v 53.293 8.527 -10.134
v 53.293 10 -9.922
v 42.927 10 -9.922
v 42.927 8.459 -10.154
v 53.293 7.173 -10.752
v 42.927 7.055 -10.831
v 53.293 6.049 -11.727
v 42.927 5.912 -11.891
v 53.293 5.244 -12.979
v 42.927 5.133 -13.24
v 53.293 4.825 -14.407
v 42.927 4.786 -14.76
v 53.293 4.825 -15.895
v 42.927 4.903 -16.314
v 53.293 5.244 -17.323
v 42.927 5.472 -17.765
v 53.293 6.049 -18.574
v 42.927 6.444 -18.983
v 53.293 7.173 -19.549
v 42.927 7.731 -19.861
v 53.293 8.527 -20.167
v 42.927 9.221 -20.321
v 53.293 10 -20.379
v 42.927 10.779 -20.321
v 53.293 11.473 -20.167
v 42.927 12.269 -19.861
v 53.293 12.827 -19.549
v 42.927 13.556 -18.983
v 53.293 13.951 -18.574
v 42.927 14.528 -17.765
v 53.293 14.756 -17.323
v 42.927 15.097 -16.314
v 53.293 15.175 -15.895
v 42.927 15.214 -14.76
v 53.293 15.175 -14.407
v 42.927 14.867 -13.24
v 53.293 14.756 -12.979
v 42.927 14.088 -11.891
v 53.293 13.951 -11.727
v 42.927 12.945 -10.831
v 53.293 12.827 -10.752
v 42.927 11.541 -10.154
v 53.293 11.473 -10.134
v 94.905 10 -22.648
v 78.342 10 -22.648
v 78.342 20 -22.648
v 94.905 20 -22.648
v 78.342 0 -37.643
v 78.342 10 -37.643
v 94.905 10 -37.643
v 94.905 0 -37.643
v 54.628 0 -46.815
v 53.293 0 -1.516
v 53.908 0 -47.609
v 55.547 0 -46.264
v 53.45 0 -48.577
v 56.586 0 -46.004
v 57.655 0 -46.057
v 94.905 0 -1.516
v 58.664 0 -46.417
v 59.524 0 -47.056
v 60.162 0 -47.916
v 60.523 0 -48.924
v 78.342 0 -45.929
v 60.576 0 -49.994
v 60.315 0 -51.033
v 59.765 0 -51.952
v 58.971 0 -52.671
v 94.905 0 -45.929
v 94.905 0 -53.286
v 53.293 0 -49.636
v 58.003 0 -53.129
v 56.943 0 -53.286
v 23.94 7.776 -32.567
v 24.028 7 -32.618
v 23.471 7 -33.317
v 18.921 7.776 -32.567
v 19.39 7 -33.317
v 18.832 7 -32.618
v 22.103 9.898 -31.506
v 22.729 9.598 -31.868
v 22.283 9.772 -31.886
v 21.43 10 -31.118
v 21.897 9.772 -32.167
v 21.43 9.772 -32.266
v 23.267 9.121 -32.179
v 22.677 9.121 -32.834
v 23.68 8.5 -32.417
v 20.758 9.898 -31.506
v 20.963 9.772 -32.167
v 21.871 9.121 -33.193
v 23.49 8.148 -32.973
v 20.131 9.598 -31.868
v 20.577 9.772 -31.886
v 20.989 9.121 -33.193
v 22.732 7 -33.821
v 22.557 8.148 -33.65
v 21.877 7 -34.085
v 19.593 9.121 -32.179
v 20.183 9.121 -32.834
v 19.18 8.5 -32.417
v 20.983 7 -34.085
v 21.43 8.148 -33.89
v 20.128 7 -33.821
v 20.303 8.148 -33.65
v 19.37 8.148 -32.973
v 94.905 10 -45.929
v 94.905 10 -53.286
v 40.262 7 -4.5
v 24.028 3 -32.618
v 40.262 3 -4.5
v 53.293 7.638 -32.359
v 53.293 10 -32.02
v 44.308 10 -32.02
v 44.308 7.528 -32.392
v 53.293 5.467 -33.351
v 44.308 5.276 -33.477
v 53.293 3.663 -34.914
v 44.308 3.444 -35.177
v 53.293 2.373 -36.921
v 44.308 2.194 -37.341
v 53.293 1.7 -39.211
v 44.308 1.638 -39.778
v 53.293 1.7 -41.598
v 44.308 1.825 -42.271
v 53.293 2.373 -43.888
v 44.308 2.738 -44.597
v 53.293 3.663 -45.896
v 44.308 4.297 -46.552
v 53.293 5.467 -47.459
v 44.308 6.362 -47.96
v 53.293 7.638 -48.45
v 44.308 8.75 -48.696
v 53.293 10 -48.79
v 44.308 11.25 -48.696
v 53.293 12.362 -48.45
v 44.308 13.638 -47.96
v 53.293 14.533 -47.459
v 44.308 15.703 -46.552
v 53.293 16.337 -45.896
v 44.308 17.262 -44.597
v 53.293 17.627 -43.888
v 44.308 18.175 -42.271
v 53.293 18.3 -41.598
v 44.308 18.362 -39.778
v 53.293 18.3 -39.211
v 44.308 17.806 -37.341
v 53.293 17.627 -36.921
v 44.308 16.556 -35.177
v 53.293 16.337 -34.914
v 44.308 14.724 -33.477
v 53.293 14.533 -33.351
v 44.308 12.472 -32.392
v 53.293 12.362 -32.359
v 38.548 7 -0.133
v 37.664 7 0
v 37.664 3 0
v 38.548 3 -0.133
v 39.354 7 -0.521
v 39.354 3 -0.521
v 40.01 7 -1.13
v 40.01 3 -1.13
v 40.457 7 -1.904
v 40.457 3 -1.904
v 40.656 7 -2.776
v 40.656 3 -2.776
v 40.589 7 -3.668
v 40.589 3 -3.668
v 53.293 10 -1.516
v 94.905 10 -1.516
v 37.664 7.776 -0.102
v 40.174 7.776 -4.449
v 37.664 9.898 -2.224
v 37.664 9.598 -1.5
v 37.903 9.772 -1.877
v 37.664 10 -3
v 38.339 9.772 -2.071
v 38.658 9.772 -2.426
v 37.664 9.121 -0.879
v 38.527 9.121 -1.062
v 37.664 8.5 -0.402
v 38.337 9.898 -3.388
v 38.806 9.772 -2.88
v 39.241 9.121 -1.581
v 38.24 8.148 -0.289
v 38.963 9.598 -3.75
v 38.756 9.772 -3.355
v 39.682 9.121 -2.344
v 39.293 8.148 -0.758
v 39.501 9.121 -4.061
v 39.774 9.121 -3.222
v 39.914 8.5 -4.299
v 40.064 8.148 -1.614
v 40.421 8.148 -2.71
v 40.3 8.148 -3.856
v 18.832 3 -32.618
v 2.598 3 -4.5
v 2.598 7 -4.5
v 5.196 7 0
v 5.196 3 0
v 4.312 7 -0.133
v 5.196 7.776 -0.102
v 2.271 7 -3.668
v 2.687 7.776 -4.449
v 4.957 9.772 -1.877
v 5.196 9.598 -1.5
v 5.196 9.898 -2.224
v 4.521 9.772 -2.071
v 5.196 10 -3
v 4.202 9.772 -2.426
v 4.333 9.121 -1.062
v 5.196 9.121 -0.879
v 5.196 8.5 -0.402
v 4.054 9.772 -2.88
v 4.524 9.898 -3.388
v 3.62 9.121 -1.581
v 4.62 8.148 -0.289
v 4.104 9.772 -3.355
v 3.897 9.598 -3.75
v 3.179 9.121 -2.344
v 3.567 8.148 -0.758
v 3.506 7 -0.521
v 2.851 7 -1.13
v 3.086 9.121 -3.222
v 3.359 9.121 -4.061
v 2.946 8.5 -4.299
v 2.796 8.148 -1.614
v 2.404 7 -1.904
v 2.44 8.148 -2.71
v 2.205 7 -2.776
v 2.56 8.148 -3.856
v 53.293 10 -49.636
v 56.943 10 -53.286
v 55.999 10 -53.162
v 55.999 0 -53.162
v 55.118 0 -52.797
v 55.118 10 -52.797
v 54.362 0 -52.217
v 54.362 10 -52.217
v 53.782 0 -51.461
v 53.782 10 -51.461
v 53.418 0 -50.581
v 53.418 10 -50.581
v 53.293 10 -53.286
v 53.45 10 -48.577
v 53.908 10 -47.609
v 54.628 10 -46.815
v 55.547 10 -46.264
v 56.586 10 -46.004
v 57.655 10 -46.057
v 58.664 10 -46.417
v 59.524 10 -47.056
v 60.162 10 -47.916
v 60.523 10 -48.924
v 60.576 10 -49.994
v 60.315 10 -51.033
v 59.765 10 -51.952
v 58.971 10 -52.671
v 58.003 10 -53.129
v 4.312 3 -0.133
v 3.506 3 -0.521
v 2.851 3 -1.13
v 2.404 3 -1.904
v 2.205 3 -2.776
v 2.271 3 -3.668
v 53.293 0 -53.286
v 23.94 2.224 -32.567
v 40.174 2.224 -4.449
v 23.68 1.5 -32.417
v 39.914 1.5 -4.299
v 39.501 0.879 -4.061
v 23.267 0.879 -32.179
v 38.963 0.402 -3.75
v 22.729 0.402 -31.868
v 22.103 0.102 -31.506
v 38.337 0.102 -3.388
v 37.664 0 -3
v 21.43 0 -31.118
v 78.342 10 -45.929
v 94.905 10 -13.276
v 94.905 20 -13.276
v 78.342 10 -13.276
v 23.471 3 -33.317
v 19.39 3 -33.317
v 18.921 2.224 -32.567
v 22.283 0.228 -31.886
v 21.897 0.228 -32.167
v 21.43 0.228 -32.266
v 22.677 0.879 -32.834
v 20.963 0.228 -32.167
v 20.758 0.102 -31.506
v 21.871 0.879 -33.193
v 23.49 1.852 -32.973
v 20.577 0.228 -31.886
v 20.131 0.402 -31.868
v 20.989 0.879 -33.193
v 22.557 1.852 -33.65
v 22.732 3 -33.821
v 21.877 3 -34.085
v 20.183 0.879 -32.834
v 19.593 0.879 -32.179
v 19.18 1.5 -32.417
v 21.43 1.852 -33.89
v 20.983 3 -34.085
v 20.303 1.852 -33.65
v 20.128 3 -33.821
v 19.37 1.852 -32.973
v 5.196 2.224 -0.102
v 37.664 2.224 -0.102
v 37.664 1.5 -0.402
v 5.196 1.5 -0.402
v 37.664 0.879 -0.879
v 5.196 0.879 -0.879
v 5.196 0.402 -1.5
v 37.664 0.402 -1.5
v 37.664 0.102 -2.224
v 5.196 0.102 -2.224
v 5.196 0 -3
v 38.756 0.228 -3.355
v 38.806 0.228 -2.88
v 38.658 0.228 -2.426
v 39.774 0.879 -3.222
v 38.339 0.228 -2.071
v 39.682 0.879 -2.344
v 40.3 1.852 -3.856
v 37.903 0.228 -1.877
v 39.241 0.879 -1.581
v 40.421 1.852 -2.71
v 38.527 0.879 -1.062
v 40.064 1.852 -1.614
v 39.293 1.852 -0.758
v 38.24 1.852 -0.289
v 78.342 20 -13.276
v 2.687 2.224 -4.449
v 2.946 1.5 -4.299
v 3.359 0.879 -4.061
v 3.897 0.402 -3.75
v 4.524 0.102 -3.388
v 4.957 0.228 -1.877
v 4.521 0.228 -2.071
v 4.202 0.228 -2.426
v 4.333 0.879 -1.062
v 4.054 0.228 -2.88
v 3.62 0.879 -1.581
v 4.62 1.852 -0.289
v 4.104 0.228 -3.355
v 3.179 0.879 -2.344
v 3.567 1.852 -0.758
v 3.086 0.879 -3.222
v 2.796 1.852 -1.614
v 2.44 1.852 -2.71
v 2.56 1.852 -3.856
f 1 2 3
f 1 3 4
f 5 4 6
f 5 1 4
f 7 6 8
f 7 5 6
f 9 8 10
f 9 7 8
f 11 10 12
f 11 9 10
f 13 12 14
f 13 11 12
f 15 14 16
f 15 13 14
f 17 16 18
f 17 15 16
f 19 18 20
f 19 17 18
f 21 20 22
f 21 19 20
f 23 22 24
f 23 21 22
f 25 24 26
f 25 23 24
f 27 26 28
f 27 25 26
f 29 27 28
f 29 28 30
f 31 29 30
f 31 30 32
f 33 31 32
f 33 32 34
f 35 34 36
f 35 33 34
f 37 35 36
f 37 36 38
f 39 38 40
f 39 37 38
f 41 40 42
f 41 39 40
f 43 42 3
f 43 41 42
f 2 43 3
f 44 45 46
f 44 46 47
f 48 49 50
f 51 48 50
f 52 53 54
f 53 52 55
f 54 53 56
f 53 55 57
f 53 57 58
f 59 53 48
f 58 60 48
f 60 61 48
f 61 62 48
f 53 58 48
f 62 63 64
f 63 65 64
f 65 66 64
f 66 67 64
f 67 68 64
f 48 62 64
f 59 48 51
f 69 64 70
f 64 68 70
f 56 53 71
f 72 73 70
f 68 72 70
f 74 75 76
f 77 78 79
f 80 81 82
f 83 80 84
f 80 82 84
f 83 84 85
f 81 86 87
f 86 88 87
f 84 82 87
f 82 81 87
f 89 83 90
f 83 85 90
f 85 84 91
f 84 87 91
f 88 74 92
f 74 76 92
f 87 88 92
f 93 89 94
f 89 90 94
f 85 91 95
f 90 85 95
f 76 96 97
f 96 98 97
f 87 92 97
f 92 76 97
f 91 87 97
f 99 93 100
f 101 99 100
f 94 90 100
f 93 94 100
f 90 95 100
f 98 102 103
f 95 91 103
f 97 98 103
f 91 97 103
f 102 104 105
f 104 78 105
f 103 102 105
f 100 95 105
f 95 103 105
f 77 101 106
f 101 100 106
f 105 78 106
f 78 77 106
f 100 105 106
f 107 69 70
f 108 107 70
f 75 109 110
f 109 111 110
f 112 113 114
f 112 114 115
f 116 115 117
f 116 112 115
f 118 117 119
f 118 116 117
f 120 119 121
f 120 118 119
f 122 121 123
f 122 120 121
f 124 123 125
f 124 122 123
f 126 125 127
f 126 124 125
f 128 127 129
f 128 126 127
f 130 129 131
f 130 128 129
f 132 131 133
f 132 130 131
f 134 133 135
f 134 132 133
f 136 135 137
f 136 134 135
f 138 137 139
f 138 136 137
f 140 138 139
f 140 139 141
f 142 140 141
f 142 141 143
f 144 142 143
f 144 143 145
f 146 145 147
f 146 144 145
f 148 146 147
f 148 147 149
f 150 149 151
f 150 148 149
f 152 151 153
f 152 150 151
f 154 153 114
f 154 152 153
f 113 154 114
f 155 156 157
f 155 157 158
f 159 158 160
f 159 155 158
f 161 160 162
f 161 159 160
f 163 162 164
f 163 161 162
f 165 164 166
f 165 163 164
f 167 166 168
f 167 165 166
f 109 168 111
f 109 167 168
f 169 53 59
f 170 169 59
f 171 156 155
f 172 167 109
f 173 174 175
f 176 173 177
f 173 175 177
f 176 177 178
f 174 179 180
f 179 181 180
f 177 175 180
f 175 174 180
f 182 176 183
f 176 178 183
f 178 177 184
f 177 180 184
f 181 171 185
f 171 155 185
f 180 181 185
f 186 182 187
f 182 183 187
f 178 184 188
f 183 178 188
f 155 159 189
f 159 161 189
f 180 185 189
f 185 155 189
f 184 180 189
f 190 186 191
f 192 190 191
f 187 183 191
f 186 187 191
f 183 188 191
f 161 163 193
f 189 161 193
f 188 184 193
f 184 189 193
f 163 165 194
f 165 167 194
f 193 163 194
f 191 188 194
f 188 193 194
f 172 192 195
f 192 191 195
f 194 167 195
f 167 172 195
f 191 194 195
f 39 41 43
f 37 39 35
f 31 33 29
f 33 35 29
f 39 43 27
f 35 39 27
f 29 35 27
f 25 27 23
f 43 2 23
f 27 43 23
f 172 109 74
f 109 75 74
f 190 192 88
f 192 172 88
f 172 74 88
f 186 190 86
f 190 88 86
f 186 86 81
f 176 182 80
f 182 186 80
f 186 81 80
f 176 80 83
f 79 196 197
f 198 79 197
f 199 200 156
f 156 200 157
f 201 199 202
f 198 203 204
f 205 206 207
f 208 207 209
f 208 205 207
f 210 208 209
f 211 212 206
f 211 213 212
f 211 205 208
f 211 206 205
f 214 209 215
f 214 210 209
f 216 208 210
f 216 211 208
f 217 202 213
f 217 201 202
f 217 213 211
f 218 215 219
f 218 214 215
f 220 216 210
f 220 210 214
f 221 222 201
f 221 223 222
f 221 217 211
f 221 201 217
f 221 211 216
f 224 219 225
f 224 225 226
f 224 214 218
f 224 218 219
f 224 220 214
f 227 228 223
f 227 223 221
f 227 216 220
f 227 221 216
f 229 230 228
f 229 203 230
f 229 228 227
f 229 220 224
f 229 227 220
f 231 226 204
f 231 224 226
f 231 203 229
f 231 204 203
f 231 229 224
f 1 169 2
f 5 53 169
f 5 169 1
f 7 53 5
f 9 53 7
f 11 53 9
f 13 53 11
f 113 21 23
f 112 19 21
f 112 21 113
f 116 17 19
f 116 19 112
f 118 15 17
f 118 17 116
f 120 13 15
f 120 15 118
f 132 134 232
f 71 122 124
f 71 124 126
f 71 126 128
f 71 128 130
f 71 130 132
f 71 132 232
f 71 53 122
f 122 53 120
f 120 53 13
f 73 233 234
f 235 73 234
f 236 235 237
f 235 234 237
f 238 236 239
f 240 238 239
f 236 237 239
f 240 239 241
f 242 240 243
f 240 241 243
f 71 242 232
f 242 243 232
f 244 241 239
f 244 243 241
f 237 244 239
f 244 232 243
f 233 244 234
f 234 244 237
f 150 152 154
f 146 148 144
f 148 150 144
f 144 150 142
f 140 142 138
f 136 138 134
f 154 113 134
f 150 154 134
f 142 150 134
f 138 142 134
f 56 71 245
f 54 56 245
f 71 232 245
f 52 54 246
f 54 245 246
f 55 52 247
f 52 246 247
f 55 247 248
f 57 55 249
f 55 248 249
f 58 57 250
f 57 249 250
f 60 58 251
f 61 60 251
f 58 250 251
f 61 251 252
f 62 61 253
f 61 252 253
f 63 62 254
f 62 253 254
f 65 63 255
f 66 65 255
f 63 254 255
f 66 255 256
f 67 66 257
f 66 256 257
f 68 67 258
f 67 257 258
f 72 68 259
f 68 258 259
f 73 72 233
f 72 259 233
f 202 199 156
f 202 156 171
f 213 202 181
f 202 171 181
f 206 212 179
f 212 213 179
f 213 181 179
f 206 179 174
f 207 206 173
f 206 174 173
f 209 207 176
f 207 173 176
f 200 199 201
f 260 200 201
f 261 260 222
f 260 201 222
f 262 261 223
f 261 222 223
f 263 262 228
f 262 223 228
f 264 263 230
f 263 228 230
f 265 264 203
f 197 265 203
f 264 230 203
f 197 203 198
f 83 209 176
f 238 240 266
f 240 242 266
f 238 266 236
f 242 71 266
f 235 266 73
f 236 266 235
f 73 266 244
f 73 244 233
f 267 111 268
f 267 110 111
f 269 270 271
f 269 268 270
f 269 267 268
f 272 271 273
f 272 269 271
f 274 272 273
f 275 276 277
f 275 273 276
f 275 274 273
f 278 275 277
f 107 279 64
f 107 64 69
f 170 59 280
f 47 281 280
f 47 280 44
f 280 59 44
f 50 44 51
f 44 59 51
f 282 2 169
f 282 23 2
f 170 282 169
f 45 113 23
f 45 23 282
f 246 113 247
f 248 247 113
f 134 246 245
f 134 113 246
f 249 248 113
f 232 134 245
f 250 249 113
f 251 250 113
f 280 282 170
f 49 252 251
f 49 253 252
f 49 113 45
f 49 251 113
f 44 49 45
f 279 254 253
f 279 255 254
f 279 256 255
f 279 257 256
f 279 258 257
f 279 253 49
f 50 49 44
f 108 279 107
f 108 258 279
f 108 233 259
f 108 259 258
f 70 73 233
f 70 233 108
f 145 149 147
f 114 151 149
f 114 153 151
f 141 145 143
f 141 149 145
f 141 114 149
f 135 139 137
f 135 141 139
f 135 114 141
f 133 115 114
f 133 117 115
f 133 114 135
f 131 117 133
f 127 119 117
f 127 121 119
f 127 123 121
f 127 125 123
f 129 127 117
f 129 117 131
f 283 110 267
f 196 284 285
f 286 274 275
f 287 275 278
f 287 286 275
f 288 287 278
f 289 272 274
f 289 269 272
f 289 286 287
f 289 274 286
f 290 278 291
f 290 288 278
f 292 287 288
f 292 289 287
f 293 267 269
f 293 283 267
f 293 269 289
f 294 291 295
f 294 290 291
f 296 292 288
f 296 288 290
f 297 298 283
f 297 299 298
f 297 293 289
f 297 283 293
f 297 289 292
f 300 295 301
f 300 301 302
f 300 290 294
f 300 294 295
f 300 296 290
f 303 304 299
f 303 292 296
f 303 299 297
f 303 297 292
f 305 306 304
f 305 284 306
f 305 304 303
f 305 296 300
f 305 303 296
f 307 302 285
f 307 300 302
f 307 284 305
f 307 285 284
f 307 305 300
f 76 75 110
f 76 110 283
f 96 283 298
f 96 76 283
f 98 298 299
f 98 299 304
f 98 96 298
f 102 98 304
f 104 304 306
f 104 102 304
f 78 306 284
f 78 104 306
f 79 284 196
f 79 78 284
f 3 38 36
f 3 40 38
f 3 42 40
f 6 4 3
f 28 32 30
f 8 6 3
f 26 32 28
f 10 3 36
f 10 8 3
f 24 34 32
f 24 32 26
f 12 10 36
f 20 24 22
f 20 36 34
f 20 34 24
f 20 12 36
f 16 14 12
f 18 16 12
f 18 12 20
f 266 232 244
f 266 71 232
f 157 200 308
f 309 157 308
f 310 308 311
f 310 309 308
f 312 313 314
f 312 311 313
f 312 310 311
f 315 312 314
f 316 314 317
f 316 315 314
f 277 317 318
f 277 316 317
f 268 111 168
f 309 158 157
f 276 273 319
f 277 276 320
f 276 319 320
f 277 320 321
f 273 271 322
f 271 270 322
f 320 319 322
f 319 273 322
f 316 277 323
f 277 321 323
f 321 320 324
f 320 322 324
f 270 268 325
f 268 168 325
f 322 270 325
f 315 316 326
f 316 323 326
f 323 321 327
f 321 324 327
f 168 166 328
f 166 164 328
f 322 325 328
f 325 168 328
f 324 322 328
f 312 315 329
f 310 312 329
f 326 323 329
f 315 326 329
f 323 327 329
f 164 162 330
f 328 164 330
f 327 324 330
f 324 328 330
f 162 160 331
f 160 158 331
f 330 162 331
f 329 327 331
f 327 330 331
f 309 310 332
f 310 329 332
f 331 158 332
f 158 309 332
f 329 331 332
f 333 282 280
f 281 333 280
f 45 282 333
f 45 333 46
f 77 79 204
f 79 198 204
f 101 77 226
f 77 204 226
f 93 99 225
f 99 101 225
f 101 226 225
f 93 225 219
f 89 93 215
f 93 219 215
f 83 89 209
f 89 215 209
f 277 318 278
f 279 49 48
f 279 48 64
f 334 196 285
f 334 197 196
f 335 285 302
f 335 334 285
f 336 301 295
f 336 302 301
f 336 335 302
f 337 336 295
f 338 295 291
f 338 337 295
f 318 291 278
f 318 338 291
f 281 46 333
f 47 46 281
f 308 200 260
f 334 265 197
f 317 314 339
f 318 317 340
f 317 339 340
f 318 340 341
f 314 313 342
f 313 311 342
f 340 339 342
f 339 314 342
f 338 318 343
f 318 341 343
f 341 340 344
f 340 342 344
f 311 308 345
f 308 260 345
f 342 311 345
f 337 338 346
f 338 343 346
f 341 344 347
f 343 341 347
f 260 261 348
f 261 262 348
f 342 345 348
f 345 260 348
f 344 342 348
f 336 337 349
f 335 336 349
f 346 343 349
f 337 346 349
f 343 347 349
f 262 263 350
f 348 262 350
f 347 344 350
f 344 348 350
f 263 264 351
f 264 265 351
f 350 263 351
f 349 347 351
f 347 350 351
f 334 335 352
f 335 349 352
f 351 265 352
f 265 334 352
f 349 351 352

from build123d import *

# Parameters (mm, degrees)
EXTRUDE_1_DEPTH     = 10
FILLET_1_R          = 3
SKETCH_5_W          = 41.61122563
SKETCH_5_H          = 51.770488075
EXTRUDE_2_DEPTH     = 10
SKETCH_6_W          = 8.984872988
SKETCH_6_H          = 8.385188636
SKETCH_7_W          = 10.365962881
SKETCH_7_H          = 5.228411738
SKETCH_8_W          = 16.562097684
SKETCH_8_H          = 8.286539358
CUT_EXTRUDE_1_DEPTH = 10
SKETCH_8_4_W        = 16.562097684
SKETCH_8_4_H        = 9.371681417
EXTRUDE_3_DEPTH     = 10
SKETCH_10_R         = 3.650023289
CUT_EXTRUDE_3_DEPTH = 10


with BuildPart() as part:
    # 草图1 → 凸台-拉伸1 (new body)
    with BuildSketch(Plane(origin=(0, 0, 0), x_dir=(1, 0, 0), z_dir=(0, 1, 0))):
        Polygon((0, 0), (42.860249516, 0), (21.430124758, 37.118064893), align=None)
    extrude(amount=EXTRUDE_1_DEPTH)

    # 圆角1
    fillet_1_edges = [part.edges().sort_by_distance(p)[0] for p in [
        (21.430124758, 0, 0),
        (32.145187137, 0, -18.559032447),
        (10.715062379, 0, -18.559032447),
        (32.145187137, 10, -18.559032447),
        (21.430124758, 10, 0),
        (10.715062379, 10, -18.559032447),
        (0, 5, 0),
        (42.860249516, 5, 0),
        (21.430124758, 5, -37.118064893),
    ]]
    fillet(fillet_1_edges, radius=FILLET_1_R)


with BuildPart() as body_2:
    # 草图5 → 凸台-拉伸2 (new body)
    with BuildSketch(Plane(origin=(0, 0, 0), x_dir=(1, 0, 0), z_dir=(0, 1, 0))):
        with Locations((74.09889893, 27.401236686)):
            Rectangle(SKETCH_5_W, SKETCH_5_H)
    extrude(amount=EXTRUDE_2_DEPTH)

    # 草图6 → 旋转1 (revolve)
    with BuildSketch(Plane(origin=(0, 10, 0), x_dir=(1, 0, 0), z_dir=(0, 1, 0))):
        with Locations((48.800849621, 44.597408971)):
            Rectangle(SKETCH_6_W, SKETCH_6_H)
    revolve(axis=Axis((44.308413127, 10, -40.404814653), (1, 0, 0)))

    # 草图7 → 旋转2 (revolve)
    with BuildSketch(Plane(origin=(0, 10, 0), x_dir=(1, 0, 0), z_dir=(0, 1, 0))):
        with Locations((48.110304675, 17.764805335)):
            Rectangle(SKETCH_7_W, SKETCH_7_H)
    revolve(axis=Axis((42.927323234, 10, -15.150599466), (1, 0, 0)))

    # 草图8 → 切除-拉伸1 (cut)
    with BuildSketch(Plane(origin=(0, 10, 0), x_dir=(1, 0, 0), z_dir=(0, 1, 0))):
        with Locations((86.623462903, 41.785904546)):
            Rectangle(SKETCH_8_W, SKETCH_8_H)
    extrude(amount=-CUT_EXTRUDE_1_DEPTH, mode=Mode.SUBTRACT)

    # 草图8<4> → 凸台-拉伸3 (add)
    with BuildSketch(Plane(origin=(0, 10, 0), x_dir=(1, 0, 0), z_dir=(0, 1, 0))):
        with Locations((86.623462903, 17.962103891)):
            Rectangle(SKETCH_8_4_W, SKETCH_8_4_H)
    extrude(amount=EXTRUDE_3_DEPTH)

    # 草图10 → 切除-拉伸3 (cut)
    with BuildSketch(Plane(origin=(0, 10, 0), x_dir=(1, 0, 0), z_dir=(0, 1, 0))):
        with Locations((56.943309403, 49.636457434)):
            Circle(SKETCH_10_R)
    extrude(amount=-CUT_EXTRUDE_3_DEPTH, mode=Mode.SUBTRACT)


with BuildPart() as cut_extrude_3_piece_1:
    # of the separate pieces the step leaves, piece 1, a body of its own (cut_extrude_3_pieces)
    add(body_2.part.solids().sort_by_distance((53.293286115, 0, -1.515992648))[0])


with BuildPart() as cut_extrude_3_piece_2:
    # of the separate pieces the step leaves, piece 2, a body of its own (cut_extrude_3_pieces)
    add(body_2.part.solids().sort_by_distance((53.293286115, 0, -53.286480723))[0])


solid = Compound([part.part, cut_extrude_3_piece_1.part, cut_extrude_3_piece_2.part])
